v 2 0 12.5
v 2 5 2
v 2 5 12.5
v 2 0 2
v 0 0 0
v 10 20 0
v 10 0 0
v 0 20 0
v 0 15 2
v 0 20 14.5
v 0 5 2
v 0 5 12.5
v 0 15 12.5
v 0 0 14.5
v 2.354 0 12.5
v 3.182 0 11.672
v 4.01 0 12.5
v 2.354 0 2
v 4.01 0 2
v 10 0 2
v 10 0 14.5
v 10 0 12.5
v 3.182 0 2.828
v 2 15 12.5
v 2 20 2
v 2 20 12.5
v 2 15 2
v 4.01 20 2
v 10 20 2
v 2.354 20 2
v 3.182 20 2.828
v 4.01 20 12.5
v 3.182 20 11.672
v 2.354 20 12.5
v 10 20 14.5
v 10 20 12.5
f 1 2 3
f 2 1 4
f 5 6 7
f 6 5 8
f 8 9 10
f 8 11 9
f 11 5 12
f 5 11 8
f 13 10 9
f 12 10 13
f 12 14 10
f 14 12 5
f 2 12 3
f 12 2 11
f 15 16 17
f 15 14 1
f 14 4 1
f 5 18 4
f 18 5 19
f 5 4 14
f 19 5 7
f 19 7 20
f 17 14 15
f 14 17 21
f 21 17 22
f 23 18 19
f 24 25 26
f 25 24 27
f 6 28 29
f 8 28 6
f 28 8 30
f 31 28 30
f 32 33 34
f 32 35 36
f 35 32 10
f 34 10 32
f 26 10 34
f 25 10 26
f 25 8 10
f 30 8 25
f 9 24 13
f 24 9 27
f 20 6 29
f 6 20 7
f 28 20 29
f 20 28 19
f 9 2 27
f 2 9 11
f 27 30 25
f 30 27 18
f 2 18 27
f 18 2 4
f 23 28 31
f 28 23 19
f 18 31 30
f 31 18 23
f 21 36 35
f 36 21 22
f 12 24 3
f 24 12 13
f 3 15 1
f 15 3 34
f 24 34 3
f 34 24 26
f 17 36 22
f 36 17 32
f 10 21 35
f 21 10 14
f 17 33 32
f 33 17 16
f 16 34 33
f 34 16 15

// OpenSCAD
module back()
{
	cube([2,5,14]);
	translate([0,15,0]) cube([2,5,14]);
}

module top()
{
	translate([0,20,14.5]) rotate([180,0,0]) bottom();
}

module bottom()
{
	cube([10,20,2]);
	rotate([0,45,0]) translate([0.25,0,2.25]) cube([2,20,2]);
}

back();
bottom();
top();
